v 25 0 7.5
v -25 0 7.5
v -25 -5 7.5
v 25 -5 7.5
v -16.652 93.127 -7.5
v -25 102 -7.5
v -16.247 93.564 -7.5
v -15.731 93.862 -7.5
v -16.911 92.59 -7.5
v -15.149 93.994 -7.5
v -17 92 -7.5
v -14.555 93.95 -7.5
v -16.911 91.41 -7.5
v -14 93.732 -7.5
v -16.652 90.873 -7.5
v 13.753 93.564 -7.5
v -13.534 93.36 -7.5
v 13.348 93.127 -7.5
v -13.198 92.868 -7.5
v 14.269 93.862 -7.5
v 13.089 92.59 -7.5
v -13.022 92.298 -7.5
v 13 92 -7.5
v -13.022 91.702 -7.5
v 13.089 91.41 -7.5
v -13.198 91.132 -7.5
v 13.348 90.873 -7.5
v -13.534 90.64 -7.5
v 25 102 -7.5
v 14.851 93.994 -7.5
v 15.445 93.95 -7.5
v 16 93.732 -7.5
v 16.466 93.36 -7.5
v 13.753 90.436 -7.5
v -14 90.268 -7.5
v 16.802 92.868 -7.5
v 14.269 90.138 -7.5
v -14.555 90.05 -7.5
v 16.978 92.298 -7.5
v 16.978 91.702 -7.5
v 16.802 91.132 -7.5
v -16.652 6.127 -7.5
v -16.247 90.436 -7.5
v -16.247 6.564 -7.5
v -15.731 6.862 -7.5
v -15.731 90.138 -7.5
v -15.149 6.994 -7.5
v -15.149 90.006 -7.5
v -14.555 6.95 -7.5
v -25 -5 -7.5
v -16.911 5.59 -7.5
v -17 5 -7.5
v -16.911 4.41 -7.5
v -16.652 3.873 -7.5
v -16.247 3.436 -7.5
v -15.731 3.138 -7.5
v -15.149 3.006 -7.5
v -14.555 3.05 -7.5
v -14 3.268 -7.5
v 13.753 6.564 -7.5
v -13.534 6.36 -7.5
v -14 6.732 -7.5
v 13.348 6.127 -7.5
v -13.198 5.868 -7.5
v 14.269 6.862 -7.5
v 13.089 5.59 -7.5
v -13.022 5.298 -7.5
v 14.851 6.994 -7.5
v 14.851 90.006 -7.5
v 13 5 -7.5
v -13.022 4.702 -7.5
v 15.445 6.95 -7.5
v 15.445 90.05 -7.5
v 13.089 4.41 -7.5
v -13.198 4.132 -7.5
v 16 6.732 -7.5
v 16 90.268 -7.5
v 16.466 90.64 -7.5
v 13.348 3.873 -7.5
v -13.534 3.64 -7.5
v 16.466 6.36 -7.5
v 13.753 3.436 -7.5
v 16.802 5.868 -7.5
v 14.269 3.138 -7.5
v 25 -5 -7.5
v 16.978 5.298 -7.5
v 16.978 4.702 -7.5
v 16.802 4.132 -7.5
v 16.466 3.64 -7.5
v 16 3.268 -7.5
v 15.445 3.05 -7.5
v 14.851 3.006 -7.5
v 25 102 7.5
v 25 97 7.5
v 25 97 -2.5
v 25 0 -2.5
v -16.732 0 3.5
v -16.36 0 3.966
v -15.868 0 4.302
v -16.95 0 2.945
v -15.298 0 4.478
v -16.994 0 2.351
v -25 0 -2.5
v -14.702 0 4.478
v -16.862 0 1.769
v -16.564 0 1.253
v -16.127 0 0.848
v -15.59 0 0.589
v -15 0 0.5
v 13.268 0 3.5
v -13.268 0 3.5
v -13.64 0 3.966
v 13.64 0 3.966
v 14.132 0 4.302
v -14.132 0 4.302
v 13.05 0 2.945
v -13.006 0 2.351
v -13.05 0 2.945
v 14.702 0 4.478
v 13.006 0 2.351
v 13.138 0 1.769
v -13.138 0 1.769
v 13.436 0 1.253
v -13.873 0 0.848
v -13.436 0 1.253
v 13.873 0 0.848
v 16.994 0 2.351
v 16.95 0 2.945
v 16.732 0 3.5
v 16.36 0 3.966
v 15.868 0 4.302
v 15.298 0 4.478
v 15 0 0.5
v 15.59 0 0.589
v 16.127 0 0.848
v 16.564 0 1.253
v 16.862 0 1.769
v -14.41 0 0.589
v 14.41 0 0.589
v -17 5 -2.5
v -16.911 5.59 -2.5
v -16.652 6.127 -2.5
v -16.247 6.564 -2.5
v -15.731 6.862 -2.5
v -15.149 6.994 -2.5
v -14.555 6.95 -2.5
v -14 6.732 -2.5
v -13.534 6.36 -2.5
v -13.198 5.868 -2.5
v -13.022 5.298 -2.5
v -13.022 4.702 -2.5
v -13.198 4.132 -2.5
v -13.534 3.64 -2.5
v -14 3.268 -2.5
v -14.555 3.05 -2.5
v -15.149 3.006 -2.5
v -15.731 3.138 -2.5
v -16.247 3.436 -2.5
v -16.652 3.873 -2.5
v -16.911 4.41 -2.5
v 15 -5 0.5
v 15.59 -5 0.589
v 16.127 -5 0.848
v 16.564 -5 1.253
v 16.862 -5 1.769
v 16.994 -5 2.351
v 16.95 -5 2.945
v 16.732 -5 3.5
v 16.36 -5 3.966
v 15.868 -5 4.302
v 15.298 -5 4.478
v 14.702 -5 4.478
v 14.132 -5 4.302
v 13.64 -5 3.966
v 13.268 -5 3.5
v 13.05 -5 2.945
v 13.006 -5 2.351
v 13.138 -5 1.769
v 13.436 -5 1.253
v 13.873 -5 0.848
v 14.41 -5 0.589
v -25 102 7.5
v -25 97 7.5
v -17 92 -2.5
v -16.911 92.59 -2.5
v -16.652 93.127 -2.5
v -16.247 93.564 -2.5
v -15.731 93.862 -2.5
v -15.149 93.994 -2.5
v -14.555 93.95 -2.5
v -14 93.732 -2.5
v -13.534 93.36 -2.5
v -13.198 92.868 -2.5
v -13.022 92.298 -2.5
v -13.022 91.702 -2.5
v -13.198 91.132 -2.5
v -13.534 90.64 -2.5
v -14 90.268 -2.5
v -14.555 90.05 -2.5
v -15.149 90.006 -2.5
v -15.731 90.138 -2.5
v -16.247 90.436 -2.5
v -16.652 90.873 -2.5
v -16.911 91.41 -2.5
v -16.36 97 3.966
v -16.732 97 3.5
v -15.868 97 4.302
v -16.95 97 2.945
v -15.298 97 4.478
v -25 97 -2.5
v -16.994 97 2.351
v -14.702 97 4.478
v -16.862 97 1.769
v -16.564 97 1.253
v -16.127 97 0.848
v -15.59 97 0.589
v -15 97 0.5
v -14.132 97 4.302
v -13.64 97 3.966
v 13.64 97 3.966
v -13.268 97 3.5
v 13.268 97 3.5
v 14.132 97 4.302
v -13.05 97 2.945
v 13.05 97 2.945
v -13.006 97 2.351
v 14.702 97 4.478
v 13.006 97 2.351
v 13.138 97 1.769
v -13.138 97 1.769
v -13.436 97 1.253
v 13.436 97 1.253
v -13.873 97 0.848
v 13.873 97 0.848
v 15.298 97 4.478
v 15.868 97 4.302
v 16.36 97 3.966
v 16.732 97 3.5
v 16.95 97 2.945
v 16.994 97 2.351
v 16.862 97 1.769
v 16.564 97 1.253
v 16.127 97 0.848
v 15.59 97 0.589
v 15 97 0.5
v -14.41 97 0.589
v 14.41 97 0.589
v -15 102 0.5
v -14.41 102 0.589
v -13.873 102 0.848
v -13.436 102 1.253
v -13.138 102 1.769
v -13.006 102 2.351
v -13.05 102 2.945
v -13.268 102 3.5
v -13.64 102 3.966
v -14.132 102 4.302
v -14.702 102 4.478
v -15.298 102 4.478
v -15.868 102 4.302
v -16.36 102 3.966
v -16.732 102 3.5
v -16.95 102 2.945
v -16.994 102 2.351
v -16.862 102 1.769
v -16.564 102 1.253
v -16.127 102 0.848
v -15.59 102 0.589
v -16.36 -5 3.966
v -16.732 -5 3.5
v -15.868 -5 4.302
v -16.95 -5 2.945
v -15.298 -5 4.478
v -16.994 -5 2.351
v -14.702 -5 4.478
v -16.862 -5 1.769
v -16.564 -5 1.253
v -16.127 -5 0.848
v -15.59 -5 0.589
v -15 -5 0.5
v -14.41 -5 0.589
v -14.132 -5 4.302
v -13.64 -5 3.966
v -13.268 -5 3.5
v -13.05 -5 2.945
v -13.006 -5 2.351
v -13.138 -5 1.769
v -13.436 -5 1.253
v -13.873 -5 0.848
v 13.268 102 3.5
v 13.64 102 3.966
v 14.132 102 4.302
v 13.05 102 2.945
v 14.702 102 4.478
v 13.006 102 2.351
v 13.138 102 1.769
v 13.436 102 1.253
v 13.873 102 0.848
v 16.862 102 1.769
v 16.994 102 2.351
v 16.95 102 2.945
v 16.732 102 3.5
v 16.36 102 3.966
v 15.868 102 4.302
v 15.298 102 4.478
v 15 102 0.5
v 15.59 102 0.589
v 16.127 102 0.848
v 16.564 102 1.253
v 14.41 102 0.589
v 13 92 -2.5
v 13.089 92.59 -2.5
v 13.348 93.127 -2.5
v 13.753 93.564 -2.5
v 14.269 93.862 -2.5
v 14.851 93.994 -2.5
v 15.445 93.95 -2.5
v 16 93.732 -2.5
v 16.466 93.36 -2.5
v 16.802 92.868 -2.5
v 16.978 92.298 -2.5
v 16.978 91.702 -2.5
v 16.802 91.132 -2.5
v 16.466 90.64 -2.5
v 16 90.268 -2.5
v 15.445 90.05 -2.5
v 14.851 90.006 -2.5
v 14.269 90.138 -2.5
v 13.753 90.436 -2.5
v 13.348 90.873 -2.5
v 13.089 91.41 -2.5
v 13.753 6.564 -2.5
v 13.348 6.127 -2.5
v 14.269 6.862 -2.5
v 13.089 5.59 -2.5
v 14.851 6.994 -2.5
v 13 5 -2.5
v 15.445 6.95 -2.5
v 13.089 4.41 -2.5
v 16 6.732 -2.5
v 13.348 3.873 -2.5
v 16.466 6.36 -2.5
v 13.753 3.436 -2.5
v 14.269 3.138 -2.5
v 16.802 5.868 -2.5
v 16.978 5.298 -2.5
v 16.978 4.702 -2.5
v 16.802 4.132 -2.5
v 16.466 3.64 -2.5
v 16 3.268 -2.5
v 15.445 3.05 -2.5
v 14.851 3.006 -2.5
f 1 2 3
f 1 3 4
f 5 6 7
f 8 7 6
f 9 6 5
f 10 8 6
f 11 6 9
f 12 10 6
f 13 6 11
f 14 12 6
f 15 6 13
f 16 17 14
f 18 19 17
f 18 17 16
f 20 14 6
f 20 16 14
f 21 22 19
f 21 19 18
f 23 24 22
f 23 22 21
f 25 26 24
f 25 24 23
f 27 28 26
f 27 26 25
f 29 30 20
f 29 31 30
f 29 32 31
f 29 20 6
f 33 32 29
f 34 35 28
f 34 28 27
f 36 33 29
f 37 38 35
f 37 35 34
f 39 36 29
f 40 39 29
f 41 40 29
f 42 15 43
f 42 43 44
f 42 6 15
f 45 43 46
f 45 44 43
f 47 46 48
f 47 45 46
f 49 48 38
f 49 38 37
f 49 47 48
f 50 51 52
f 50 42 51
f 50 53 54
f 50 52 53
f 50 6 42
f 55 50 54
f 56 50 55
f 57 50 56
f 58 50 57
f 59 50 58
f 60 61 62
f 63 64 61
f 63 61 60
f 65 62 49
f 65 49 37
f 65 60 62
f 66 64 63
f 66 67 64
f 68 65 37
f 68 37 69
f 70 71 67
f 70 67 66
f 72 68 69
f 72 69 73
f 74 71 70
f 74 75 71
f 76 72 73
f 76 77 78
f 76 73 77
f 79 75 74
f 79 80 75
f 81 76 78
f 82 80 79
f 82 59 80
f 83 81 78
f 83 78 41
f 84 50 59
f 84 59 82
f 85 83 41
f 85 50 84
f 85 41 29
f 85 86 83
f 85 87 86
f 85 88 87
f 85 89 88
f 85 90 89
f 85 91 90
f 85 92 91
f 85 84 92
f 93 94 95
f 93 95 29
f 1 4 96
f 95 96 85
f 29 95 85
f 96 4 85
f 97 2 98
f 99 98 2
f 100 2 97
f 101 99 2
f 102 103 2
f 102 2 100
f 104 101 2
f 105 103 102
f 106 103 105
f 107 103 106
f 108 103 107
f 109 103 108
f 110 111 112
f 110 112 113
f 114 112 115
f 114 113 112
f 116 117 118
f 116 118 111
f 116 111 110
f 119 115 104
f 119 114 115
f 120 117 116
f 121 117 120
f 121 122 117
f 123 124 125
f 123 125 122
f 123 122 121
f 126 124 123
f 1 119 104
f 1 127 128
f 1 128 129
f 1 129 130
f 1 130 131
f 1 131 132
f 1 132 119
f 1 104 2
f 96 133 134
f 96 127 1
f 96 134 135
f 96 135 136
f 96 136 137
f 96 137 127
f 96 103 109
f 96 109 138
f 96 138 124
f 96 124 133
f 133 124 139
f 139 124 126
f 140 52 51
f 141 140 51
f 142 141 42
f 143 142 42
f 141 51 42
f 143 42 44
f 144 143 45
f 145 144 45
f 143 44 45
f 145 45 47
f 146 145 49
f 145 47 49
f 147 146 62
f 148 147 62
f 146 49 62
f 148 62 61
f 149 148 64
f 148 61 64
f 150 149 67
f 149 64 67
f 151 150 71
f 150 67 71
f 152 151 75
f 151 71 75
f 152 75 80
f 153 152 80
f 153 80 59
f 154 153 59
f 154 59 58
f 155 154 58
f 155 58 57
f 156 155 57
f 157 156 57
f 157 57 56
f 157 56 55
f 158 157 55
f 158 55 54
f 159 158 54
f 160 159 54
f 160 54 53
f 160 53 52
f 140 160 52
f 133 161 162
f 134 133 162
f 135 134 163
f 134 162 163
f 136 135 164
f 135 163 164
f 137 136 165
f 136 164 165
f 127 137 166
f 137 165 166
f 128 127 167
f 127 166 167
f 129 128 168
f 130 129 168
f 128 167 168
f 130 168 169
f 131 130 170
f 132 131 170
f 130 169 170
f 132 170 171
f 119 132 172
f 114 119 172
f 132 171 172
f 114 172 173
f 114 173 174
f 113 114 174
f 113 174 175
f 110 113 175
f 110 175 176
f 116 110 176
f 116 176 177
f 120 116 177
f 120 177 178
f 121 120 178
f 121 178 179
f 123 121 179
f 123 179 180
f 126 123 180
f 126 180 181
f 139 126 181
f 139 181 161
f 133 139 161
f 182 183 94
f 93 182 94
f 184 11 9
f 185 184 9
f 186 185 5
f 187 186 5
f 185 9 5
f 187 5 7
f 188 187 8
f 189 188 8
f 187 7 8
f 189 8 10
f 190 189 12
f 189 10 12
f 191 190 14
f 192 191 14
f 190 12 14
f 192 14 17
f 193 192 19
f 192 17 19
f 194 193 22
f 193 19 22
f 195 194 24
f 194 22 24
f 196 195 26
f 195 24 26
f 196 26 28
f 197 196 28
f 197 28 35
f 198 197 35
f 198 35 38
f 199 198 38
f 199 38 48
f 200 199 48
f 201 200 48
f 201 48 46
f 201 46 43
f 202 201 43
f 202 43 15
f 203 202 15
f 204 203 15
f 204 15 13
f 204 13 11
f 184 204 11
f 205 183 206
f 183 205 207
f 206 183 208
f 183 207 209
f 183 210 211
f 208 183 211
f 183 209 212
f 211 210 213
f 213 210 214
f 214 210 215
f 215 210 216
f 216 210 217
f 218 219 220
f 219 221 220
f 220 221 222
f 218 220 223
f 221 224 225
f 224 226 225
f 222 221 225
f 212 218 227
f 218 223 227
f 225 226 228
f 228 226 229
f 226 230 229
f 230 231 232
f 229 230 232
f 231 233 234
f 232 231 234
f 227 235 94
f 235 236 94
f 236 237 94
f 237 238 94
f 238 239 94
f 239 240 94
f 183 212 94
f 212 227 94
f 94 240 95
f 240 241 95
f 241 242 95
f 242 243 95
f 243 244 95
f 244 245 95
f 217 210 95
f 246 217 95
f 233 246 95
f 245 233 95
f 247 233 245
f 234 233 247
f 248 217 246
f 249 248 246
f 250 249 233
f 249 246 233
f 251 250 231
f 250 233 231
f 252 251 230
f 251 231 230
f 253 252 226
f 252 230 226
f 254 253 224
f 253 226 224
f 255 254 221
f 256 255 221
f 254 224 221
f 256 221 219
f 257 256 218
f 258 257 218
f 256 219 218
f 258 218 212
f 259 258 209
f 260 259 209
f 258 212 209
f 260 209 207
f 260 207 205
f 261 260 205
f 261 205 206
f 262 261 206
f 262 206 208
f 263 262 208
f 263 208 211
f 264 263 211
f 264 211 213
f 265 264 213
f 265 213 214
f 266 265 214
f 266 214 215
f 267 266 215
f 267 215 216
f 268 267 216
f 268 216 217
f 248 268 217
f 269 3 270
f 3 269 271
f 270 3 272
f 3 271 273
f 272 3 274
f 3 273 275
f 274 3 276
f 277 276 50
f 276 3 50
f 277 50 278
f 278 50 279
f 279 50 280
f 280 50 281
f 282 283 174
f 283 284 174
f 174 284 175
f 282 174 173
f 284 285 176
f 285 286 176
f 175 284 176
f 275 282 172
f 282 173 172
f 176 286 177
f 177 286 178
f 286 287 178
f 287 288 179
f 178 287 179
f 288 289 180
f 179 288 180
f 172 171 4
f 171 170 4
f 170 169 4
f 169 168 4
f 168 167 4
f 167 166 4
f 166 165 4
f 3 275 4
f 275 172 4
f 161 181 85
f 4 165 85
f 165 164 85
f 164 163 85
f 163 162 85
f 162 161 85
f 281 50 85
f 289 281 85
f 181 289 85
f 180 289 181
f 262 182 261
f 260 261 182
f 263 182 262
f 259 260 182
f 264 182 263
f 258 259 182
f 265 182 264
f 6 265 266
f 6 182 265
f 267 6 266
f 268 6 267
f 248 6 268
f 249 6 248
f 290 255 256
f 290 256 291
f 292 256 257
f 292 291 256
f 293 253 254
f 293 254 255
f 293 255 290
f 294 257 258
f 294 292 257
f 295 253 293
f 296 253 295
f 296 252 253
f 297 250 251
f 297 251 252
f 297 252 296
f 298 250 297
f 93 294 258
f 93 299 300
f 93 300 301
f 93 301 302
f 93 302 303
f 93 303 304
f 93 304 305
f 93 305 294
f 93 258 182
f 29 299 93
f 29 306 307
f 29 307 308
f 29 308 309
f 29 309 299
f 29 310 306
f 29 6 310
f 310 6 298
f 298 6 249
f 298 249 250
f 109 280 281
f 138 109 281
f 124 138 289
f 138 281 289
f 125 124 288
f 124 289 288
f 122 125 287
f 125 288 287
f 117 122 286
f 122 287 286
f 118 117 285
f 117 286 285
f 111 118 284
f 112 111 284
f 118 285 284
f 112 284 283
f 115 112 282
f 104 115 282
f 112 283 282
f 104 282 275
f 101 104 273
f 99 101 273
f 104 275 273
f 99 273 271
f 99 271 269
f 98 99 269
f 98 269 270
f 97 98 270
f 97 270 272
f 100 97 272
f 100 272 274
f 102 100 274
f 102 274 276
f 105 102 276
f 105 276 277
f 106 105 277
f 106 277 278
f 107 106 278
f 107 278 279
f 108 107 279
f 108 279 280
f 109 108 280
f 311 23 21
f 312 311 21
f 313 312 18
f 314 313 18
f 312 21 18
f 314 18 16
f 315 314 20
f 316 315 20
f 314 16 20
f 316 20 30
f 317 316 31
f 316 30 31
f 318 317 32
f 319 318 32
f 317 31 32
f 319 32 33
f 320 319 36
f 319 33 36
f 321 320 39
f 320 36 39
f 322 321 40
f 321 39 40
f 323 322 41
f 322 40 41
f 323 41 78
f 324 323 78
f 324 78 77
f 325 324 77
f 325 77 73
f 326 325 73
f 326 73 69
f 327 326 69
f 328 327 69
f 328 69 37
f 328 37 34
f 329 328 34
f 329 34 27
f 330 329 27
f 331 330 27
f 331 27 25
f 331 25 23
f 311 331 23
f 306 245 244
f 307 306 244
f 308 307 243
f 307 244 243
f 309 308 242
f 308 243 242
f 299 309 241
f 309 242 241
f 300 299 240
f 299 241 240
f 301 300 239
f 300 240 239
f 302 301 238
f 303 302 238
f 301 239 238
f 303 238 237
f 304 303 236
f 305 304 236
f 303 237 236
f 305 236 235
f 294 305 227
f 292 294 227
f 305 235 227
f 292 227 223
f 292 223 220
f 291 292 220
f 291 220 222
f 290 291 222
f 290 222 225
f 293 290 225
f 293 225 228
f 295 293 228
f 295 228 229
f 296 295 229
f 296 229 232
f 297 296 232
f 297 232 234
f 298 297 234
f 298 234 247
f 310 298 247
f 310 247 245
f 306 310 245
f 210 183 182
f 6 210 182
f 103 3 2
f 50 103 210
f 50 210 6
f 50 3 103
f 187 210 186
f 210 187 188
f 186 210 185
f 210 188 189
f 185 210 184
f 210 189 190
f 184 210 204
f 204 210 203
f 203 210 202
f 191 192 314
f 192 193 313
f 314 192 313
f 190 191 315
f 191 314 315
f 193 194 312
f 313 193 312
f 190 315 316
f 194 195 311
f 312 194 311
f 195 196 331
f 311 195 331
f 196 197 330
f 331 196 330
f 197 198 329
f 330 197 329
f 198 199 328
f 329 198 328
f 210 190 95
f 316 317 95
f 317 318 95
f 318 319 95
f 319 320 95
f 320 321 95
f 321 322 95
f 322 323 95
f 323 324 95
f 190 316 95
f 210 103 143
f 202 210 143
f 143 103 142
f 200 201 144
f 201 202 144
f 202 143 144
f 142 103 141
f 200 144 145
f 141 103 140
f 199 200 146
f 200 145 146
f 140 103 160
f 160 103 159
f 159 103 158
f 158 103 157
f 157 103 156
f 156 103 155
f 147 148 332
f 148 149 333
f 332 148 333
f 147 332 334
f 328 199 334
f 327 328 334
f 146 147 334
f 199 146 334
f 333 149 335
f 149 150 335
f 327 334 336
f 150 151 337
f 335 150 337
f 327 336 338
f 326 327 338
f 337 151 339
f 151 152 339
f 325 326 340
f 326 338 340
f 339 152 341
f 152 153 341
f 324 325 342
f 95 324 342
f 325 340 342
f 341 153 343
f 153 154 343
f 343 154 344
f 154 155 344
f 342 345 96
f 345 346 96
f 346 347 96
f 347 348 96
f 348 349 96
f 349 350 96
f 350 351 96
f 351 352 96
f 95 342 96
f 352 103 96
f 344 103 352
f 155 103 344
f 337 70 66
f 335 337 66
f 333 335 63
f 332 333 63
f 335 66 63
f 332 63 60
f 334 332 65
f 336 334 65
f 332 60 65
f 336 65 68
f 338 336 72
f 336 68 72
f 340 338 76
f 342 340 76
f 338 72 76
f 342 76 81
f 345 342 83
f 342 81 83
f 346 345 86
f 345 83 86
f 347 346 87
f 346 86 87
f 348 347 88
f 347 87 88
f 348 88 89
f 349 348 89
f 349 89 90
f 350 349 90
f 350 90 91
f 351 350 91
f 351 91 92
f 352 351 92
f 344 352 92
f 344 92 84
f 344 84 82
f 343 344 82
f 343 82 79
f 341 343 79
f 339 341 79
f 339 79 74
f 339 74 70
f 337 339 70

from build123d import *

# Parameters (mm, degrees)
SKETCH1_W                       = 50
SKETCH1_H                       = 15
BOSS_EXTRUDE1_DEPTH             = 5
SKETCH2_W                       = 50
SKETCH2_H                       = 5
BOSS_EXTRUDE2_DEPTH             = 97
SKETCH3_W                       = 50
SKETCH3_H                       = 15
BOSS_EXTRUDE3_DEPTH             = 5
F_4_0MM_DOWEL_HOLE1_D           = 4
F_4_0MM_DOWEL_HOLE1_ON_FACE_2_D = 4
F_4_0MM_DOWEL_HOLE1_ON_FACE_3_D = 4


with BuildPart() as part:
    # Sketch1 → Boss-Extrude1 (new body)
    with BuildSketch(Plane(origin=(0, 0, 0), x_dir=(1, 0, 0), z_dir=(0, 1, 0))):
        Rectangle(SKETCH1_W, SKETCH1_H)
    extrude(amount=-BOSS_EXTRUDE1_DEPTH)

    # Sketch2 → Boss-Extrude2 (add)
    with BuildSketch(Plane(origin=(0, 0, 0), x_dir=(1, 0, 0), z_dir=(0, 1, 0))):
        with Locations((0, 5)):
            Rectangle(SKETCH2_W, SKETCH2_H)
    extrude(amount=BOSS_EXTRUDE2_DEPTH)

    # Sketch3 → Boss-Extrude3 (add)
    with BuildSketch(Plane(origin=(0, 97, 0), x_dir=(1, 0, 0), z_dir=(0, 1, 0))):
        Rectangle(SKETCH3_W, SKETCH3_H)
    extrude(amount=BOSS_EXTRUDE3_DEPTH)

    # Ø4.0mm Dowel Hole1 (through all)
    with Locations(Plane(origin=(-15, 0, 2.5), x_dir=(0, 0, 1), z_dir=(0, 1, 0))):
        with Locations((0, 0), (0, 30)):
            Hole(F_4_0MM_DOWEL_HOLE1_D / 2)

    # Ø4.0mm Dowel Hole1 on face 2 (through all)
    with Locations(Plane(origin=(-15, 5, -2.5), x_dir=(1, 0, 0), z_dir=(0, 0, 1))):
        with Locations((0, 0), (30, 0), (0, 87), (30, 87)):
            Hole(F_4_0MM_DOWEL_HOLE1_ON_FACE_2_D / 2)

    # Ø4.0mm Dowel Hole1 on face 3 (through all)
    with Locations(Plane(origin=(15, 97, 2.5), x_dir=(0, 0, -1), z_dir=(0, -1, 0))):
        with Locations((0, 0), (0, -30)):
            Hole(F_4_0MM_DOWEL_HOLE1_ON_FACE_3_D / 2)


solid = part.part
